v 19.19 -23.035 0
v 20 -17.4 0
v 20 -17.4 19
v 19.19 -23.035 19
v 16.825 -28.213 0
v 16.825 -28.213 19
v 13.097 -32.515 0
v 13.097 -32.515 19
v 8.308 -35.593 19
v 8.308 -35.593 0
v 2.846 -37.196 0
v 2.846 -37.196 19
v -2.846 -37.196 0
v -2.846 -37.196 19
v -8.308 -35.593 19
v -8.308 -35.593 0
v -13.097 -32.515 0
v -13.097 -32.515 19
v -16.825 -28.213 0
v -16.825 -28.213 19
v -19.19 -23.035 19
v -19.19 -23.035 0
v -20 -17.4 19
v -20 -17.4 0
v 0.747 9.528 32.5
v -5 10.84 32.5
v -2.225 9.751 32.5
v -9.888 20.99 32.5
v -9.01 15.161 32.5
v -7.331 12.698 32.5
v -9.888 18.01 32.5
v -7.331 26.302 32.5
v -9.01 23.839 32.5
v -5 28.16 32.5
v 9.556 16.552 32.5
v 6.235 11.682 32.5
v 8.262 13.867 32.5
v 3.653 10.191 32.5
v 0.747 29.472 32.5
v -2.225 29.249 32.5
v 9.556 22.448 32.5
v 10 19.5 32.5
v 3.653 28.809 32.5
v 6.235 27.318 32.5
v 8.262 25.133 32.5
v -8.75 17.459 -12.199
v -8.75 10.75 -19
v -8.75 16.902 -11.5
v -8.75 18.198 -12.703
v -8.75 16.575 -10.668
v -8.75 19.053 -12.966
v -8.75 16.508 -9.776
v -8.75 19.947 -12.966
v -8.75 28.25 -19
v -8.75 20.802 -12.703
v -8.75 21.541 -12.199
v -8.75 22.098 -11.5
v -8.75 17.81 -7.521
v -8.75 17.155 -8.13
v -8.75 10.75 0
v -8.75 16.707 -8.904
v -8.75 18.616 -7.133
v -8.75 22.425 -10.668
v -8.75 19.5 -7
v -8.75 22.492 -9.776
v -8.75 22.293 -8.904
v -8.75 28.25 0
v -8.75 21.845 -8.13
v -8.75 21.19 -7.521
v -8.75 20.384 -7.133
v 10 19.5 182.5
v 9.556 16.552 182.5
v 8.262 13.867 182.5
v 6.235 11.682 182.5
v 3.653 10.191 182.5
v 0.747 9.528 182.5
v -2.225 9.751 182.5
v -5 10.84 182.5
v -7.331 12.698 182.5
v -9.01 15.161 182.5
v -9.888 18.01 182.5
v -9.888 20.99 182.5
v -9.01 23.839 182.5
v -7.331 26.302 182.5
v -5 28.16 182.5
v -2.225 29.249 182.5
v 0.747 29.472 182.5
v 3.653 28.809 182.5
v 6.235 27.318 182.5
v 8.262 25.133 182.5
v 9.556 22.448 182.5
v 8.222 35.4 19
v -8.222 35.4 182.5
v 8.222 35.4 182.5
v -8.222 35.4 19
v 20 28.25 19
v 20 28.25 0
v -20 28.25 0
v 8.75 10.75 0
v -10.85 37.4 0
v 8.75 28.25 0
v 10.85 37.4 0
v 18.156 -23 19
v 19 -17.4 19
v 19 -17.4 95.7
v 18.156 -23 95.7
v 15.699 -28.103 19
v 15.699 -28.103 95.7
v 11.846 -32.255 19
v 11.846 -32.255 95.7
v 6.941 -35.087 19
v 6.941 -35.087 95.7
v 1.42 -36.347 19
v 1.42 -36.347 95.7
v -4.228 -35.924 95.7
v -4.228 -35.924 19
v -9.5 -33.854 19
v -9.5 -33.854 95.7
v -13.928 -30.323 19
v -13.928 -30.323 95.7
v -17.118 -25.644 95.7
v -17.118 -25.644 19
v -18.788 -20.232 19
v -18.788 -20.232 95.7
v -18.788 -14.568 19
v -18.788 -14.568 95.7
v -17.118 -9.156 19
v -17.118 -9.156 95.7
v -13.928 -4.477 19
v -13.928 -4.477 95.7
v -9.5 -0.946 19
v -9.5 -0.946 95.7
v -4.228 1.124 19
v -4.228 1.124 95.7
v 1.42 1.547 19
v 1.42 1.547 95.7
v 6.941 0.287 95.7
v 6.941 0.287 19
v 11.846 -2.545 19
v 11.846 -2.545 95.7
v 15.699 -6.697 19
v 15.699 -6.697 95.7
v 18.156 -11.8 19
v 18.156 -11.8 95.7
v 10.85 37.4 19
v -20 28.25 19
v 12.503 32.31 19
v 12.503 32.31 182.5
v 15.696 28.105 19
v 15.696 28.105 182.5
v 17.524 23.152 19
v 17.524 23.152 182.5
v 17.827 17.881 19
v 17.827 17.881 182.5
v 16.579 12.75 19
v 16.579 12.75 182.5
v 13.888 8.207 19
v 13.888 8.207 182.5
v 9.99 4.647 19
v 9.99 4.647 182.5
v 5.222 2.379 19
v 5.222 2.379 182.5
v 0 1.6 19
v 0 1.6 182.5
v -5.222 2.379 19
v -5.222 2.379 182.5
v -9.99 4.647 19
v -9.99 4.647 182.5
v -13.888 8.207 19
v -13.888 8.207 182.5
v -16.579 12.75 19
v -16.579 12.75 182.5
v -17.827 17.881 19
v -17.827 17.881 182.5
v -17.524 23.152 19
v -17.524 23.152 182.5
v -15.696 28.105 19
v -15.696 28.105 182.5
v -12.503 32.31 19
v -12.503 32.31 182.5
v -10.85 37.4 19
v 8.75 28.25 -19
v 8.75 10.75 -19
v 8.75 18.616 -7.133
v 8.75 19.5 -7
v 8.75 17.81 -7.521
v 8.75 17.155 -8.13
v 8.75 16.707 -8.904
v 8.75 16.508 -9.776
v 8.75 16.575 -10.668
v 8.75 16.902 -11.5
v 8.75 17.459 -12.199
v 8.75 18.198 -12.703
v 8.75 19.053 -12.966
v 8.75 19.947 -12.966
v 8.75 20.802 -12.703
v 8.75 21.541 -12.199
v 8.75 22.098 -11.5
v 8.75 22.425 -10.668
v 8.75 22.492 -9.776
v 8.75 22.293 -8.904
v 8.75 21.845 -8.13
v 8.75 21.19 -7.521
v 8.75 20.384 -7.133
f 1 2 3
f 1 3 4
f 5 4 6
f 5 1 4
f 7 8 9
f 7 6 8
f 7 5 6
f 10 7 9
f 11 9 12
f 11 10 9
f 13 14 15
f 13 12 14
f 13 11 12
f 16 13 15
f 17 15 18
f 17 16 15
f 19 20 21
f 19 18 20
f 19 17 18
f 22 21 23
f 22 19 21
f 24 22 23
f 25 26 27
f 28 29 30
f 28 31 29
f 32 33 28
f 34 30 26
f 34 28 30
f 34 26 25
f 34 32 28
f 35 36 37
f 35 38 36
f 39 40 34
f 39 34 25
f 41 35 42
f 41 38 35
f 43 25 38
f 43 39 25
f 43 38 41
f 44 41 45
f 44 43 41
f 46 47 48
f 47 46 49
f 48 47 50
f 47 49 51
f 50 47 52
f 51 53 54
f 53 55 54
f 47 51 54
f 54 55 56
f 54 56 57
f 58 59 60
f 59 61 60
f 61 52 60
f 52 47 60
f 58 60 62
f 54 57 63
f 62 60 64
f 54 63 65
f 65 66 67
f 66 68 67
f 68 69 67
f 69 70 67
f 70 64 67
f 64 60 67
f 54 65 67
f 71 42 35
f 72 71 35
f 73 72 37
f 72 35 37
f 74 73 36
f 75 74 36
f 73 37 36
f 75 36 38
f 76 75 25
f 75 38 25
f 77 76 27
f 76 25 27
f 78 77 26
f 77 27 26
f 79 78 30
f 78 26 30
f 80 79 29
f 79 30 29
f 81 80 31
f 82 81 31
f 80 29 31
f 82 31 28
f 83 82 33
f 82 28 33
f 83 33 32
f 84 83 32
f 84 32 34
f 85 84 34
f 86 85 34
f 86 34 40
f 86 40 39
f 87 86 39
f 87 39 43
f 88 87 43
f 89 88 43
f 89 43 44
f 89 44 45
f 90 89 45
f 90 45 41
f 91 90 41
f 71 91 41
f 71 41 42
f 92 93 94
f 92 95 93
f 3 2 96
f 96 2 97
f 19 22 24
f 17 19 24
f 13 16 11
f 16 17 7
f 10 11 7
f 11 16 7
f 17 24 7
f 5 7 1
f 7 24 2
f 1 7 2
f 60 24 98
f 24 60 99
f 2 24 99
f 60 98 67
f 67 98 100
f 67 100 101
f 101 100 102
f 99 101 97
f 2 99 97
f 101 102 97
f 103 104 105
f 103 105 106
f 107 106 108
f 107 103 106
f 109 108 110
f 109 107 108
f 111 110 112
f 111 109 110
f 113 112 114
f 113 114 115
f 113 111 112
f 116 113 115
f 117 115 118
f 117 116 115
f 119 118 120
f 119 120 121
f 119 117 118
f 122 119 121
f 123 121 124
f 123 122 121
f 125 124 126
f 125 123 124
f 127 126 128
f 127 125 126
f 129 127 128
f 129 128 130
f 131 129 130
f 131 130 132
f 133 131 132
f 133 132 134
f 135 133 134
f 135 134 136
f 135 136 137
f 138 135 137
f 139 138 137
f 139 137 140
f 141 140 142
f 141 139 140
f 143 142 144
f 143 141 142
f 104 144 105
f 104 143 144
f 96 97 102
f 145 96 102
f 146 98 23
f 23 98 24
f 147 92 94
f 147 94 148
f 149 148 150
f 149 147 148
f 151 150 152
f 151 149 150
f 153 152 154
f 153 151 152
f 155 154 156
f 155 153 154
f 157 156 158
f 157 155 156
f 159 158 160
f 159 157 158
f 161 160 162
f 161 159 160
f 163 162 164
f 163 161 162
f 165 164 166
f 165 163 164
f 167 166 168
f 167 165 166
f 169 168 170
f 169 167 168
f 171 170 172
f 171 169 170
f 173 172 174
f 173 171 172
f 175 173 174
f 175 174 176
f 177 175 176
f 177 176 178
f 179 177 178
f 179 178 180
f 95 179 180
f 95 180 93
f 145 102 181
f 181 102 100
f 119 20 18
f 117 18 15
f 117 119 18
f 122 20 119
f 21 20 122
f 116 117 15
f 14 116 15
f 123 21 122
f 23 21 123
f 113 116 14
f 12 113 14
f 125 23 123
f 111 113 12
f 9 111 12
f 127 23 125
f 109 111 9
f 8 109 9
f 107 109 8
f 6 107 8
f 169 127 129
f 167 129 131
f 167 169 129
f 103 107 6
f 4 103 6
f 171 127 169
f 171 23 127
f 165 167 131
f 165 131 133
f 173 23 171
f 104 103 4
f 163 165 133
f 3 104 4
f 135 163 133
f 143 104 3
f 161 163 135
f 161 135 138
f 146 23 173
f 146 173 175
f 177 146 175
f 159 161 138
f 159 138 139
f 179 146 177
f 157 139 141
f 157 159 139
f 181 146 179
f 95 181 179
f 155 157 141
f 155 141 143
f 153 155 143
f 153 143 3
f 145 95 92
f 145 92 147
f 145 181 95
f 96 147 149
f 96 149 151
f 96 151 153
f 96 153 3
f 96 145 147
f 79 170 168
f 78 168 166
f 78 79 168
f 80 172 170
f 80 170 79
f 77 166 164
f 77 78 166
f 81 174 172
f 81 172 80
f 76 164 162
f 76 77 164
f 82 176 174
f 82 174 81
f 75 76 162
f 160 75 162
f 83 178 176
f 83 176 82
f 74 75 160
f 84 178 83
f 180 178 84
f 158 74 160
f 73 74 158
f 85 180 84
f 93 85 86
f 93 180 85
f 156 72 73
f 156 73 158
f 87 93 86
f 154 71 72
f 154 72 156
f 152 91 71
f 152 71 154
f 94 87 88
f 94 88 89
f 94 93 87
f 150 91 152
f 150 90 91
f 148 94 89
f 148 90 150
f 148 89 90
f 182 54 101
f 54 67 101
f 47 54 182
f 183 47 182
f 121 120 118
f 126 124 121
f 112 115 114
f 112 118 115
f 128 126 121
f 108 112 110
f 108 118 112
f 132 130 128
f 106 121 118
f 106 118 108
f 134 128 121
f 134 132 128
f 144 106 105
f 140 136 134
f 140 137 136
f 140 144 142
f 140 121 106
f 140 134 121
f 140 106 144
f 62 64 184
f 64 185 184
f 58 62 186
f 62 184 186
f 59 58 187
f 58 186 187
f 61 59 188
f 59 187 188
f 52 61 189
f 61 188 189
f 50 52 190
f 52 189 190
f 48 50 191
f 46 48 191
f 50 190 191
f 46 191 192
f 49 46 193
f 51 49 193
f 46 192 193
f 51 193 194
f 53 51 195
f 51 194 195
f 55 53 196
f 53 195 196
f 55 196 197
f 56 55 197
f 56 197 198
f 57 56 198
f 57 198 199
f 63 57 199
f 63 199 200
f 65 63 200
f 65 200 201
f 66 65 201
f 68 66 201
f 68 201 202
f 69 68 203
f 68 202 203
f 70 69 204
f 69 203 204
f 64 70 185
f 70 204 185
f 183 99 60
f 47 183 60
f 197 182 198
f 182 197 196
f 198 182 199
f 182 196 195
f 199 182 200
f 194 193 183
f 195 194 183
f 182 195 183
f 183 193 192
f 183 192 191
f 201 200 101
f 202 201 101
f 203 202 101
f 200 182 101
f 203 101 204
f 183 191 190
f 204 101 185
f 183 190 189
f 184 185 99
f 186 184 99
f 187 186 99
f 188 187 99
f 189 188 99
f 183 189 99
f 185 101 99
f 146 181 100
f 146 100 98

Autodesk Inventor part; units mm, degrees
ref_plane "YZ Plane" through (0, 0, 0) normal (1, 0, 0) x (0, 1, 0)
ref_plane "XZ Plane" through (0, 0, 0) normal (0, 1, 0) x (-1, 0, 0)
ref_plane "XY Plane" through (0, 0, 0) normal (0, 0, 1) x (1, 0, 0)
sketch "Sketch1" plane through (0, 0, 0) normal (0, 0, 1) x (1, 0, 0)
  line L0 (-20, -37.4) -> (20, -37.4) construction
  line L1 (20, -37.4) -> (20, 37.4) construction
  line L2 (20, 37.4) -> (-20, 37.4) construction
  line L3 (-20, 37.4) -> (-20, -37.4) construction
  line L4 (-20, -37.4) -> (20, 37.4) construction
  line L5 (20, -37.4) -> (-20, 37.4) construction
  line L6 (0, 37.4) -> (0, -37.4) construction
  line L7 (-20, 0) -> (20, 0) construction
  circle A0 centre (0, -17.4) radius 19
  line L8 (8.75, 10.75) -> (-8.75, 10.75)
  line L9 (-8.75, 10.75) -> (-8.75, 28.25)
  line L10 (-8.75, 28.25) -> (8.75, 28.25)
  line L11 (8.75, 28.25) -> (8.75, 10.75)
  line L12 (8.75, 10.75) -> (-8.75, 28.25) construction
  line L13 (-8.75, 10.75) -> (8.75, 28.25) construction
  line L14 (20, 1.6) -> (-20, 1.6) construction
  line L15 (-20, 37.4) -> (-10.85, 37.4) construction
  line L16 (-10.85, 37.4) -> (-10.85, 28.25) construction
  line L17 (-10.85, 28.25) -> (-20, 28.25) construction
  line L18 (-20, 28.25) -> (-20, 37.4) construction
  line L19 (20, 37.4) -> (10.85, 37.4) construction
  line L20 (10.85, 37.4) -> (10.85, 28.25) construction
  line L21 (10.85, 28.25) -> (20, 28.25) construction
  line L22 (20, 28.25) -> (20, 37.4) construction
  line L23 (-10.85, 37.4) -> (-20, 28.25)
  line L24 (-20, -17.4) -> (20, -17.4) construction
  arc A1 (-20, -17.4) -> (20, -17.4) centre (0, -17.4) ccw
  line L25 (-20, 28.25) -> (-20, -17.4)
  line L26 (20, -17.4) -> (20, 28.25)
  line L27 (20, 28.25) -> (10.85, 37.4)
  line L28 (10.85, 37.4) -> (-10.85, 37.4)
  circle A2 centre (0, 19.5) radius 17.9 construction
  circle A3 centre (0, 19.5) radius 10
  line L29 (-8.2219, 35.4) -> (8.2219, 35.4)
  arc A4 (-8.2219, 35.4) -> (8.2219, 35.4) centre (0, 19.5) ccw
  point P0 (0, 0)
  point P1 (0, 1.6)
  point P2 (-10.85, 33.7368)
  point P3 (10.85, 33.7368)
  dimension "d2" = 38
  dimension "d0" = 40
  dimension "d1" = 74.8
  dimension "d3" = 20
  dimension "d4" = 17.5
  dimension "d5" = 17.5
  dimension "d6" = 35.8
  dimension "d7" = 9.15
  dimension "d8" = 9.15
  dimension "d9" = 9.15
  dimension "d10" = 9.15
  dimension "d11" = 9.15
  dimension "d12" = 45.65
  dimension "d21" = 20
  dimension "d22" = 2
extrude "Extrusion1" add sketch "Sketch1" along normal blind 95.7 contours A0
extrude "Extrusion2" add sketch "Sketch1" against normal blind 19 contours L8 A3 L11 | L8 A3 L9 L10 L11 | L8 L9 A3 | A3 L10 L11 | L9 L10 A3
extrude "Extrusion3" add sketch "Sketch1" along normal blind 19 contours A4 L29 | A3 L8 | L11 A3 | A3 L9 | L10 A3 | L28 L27 L26 A1 L25 L23
extrude "Extrusion5" add sketch "Sketch1" along normal blind 182.5 contours A4 L29 | L8 A3 L11 | A3 L8 | L8 A3 L9 L10 L11 | L11 A3 | L8 L9 A3 | A3 L10 L11 | A3 L9 | L10 A3 | L9 L10 A3
extrude "Extrusion6" cut sketch "Sketch1" along normal blind 182.5 contours A3 L8 | L8 A3 L9 L10 L11 | L11 A3 | A3 L9 | L10 A3
extrude "Extrusion7" add sketch "Sketch1" along normal blind 32.5 contours A3 L8 | L8 A3 L9 L10 L11 | L11 A3 | A3 L9 | L10 A3
sketch "Sketch2" plane through (-8.75, 10.75, 0) normal (-1, 0, 0) x (0, 0, 1)
  line L0 (0, 26.65) -> (0, 17.5) construction
  line L1 (0, 0) -> (-19, 0) construction
  line L2 (0, 17.5) -> (-10, 17.5) construction
  line L3 (-10, 17.5) -> (-10, 0) construction
  line L4 (-10, 0) -> (0, 0) construction
  line L5 (0, 0) -> (0, 17.5) construction
  point P0 (0, -10.75)
  point P1 (-10, 8.75)
  dimension "d29" = 10
hole "Hole1" at (-8.75, 19.5, -10) direction (1, 0, 0) diameter 6 end through all both
equation "\"d5\" = d4"
equation "\"d7\" = 0.5 * d6 - 0.5 * d4"
equation "\"d9\" = d8"
equation "\"d10\" = d9"
equation "\"d11\" = d10"
properties part number "actuator_base" material "Aluminum 6061"
